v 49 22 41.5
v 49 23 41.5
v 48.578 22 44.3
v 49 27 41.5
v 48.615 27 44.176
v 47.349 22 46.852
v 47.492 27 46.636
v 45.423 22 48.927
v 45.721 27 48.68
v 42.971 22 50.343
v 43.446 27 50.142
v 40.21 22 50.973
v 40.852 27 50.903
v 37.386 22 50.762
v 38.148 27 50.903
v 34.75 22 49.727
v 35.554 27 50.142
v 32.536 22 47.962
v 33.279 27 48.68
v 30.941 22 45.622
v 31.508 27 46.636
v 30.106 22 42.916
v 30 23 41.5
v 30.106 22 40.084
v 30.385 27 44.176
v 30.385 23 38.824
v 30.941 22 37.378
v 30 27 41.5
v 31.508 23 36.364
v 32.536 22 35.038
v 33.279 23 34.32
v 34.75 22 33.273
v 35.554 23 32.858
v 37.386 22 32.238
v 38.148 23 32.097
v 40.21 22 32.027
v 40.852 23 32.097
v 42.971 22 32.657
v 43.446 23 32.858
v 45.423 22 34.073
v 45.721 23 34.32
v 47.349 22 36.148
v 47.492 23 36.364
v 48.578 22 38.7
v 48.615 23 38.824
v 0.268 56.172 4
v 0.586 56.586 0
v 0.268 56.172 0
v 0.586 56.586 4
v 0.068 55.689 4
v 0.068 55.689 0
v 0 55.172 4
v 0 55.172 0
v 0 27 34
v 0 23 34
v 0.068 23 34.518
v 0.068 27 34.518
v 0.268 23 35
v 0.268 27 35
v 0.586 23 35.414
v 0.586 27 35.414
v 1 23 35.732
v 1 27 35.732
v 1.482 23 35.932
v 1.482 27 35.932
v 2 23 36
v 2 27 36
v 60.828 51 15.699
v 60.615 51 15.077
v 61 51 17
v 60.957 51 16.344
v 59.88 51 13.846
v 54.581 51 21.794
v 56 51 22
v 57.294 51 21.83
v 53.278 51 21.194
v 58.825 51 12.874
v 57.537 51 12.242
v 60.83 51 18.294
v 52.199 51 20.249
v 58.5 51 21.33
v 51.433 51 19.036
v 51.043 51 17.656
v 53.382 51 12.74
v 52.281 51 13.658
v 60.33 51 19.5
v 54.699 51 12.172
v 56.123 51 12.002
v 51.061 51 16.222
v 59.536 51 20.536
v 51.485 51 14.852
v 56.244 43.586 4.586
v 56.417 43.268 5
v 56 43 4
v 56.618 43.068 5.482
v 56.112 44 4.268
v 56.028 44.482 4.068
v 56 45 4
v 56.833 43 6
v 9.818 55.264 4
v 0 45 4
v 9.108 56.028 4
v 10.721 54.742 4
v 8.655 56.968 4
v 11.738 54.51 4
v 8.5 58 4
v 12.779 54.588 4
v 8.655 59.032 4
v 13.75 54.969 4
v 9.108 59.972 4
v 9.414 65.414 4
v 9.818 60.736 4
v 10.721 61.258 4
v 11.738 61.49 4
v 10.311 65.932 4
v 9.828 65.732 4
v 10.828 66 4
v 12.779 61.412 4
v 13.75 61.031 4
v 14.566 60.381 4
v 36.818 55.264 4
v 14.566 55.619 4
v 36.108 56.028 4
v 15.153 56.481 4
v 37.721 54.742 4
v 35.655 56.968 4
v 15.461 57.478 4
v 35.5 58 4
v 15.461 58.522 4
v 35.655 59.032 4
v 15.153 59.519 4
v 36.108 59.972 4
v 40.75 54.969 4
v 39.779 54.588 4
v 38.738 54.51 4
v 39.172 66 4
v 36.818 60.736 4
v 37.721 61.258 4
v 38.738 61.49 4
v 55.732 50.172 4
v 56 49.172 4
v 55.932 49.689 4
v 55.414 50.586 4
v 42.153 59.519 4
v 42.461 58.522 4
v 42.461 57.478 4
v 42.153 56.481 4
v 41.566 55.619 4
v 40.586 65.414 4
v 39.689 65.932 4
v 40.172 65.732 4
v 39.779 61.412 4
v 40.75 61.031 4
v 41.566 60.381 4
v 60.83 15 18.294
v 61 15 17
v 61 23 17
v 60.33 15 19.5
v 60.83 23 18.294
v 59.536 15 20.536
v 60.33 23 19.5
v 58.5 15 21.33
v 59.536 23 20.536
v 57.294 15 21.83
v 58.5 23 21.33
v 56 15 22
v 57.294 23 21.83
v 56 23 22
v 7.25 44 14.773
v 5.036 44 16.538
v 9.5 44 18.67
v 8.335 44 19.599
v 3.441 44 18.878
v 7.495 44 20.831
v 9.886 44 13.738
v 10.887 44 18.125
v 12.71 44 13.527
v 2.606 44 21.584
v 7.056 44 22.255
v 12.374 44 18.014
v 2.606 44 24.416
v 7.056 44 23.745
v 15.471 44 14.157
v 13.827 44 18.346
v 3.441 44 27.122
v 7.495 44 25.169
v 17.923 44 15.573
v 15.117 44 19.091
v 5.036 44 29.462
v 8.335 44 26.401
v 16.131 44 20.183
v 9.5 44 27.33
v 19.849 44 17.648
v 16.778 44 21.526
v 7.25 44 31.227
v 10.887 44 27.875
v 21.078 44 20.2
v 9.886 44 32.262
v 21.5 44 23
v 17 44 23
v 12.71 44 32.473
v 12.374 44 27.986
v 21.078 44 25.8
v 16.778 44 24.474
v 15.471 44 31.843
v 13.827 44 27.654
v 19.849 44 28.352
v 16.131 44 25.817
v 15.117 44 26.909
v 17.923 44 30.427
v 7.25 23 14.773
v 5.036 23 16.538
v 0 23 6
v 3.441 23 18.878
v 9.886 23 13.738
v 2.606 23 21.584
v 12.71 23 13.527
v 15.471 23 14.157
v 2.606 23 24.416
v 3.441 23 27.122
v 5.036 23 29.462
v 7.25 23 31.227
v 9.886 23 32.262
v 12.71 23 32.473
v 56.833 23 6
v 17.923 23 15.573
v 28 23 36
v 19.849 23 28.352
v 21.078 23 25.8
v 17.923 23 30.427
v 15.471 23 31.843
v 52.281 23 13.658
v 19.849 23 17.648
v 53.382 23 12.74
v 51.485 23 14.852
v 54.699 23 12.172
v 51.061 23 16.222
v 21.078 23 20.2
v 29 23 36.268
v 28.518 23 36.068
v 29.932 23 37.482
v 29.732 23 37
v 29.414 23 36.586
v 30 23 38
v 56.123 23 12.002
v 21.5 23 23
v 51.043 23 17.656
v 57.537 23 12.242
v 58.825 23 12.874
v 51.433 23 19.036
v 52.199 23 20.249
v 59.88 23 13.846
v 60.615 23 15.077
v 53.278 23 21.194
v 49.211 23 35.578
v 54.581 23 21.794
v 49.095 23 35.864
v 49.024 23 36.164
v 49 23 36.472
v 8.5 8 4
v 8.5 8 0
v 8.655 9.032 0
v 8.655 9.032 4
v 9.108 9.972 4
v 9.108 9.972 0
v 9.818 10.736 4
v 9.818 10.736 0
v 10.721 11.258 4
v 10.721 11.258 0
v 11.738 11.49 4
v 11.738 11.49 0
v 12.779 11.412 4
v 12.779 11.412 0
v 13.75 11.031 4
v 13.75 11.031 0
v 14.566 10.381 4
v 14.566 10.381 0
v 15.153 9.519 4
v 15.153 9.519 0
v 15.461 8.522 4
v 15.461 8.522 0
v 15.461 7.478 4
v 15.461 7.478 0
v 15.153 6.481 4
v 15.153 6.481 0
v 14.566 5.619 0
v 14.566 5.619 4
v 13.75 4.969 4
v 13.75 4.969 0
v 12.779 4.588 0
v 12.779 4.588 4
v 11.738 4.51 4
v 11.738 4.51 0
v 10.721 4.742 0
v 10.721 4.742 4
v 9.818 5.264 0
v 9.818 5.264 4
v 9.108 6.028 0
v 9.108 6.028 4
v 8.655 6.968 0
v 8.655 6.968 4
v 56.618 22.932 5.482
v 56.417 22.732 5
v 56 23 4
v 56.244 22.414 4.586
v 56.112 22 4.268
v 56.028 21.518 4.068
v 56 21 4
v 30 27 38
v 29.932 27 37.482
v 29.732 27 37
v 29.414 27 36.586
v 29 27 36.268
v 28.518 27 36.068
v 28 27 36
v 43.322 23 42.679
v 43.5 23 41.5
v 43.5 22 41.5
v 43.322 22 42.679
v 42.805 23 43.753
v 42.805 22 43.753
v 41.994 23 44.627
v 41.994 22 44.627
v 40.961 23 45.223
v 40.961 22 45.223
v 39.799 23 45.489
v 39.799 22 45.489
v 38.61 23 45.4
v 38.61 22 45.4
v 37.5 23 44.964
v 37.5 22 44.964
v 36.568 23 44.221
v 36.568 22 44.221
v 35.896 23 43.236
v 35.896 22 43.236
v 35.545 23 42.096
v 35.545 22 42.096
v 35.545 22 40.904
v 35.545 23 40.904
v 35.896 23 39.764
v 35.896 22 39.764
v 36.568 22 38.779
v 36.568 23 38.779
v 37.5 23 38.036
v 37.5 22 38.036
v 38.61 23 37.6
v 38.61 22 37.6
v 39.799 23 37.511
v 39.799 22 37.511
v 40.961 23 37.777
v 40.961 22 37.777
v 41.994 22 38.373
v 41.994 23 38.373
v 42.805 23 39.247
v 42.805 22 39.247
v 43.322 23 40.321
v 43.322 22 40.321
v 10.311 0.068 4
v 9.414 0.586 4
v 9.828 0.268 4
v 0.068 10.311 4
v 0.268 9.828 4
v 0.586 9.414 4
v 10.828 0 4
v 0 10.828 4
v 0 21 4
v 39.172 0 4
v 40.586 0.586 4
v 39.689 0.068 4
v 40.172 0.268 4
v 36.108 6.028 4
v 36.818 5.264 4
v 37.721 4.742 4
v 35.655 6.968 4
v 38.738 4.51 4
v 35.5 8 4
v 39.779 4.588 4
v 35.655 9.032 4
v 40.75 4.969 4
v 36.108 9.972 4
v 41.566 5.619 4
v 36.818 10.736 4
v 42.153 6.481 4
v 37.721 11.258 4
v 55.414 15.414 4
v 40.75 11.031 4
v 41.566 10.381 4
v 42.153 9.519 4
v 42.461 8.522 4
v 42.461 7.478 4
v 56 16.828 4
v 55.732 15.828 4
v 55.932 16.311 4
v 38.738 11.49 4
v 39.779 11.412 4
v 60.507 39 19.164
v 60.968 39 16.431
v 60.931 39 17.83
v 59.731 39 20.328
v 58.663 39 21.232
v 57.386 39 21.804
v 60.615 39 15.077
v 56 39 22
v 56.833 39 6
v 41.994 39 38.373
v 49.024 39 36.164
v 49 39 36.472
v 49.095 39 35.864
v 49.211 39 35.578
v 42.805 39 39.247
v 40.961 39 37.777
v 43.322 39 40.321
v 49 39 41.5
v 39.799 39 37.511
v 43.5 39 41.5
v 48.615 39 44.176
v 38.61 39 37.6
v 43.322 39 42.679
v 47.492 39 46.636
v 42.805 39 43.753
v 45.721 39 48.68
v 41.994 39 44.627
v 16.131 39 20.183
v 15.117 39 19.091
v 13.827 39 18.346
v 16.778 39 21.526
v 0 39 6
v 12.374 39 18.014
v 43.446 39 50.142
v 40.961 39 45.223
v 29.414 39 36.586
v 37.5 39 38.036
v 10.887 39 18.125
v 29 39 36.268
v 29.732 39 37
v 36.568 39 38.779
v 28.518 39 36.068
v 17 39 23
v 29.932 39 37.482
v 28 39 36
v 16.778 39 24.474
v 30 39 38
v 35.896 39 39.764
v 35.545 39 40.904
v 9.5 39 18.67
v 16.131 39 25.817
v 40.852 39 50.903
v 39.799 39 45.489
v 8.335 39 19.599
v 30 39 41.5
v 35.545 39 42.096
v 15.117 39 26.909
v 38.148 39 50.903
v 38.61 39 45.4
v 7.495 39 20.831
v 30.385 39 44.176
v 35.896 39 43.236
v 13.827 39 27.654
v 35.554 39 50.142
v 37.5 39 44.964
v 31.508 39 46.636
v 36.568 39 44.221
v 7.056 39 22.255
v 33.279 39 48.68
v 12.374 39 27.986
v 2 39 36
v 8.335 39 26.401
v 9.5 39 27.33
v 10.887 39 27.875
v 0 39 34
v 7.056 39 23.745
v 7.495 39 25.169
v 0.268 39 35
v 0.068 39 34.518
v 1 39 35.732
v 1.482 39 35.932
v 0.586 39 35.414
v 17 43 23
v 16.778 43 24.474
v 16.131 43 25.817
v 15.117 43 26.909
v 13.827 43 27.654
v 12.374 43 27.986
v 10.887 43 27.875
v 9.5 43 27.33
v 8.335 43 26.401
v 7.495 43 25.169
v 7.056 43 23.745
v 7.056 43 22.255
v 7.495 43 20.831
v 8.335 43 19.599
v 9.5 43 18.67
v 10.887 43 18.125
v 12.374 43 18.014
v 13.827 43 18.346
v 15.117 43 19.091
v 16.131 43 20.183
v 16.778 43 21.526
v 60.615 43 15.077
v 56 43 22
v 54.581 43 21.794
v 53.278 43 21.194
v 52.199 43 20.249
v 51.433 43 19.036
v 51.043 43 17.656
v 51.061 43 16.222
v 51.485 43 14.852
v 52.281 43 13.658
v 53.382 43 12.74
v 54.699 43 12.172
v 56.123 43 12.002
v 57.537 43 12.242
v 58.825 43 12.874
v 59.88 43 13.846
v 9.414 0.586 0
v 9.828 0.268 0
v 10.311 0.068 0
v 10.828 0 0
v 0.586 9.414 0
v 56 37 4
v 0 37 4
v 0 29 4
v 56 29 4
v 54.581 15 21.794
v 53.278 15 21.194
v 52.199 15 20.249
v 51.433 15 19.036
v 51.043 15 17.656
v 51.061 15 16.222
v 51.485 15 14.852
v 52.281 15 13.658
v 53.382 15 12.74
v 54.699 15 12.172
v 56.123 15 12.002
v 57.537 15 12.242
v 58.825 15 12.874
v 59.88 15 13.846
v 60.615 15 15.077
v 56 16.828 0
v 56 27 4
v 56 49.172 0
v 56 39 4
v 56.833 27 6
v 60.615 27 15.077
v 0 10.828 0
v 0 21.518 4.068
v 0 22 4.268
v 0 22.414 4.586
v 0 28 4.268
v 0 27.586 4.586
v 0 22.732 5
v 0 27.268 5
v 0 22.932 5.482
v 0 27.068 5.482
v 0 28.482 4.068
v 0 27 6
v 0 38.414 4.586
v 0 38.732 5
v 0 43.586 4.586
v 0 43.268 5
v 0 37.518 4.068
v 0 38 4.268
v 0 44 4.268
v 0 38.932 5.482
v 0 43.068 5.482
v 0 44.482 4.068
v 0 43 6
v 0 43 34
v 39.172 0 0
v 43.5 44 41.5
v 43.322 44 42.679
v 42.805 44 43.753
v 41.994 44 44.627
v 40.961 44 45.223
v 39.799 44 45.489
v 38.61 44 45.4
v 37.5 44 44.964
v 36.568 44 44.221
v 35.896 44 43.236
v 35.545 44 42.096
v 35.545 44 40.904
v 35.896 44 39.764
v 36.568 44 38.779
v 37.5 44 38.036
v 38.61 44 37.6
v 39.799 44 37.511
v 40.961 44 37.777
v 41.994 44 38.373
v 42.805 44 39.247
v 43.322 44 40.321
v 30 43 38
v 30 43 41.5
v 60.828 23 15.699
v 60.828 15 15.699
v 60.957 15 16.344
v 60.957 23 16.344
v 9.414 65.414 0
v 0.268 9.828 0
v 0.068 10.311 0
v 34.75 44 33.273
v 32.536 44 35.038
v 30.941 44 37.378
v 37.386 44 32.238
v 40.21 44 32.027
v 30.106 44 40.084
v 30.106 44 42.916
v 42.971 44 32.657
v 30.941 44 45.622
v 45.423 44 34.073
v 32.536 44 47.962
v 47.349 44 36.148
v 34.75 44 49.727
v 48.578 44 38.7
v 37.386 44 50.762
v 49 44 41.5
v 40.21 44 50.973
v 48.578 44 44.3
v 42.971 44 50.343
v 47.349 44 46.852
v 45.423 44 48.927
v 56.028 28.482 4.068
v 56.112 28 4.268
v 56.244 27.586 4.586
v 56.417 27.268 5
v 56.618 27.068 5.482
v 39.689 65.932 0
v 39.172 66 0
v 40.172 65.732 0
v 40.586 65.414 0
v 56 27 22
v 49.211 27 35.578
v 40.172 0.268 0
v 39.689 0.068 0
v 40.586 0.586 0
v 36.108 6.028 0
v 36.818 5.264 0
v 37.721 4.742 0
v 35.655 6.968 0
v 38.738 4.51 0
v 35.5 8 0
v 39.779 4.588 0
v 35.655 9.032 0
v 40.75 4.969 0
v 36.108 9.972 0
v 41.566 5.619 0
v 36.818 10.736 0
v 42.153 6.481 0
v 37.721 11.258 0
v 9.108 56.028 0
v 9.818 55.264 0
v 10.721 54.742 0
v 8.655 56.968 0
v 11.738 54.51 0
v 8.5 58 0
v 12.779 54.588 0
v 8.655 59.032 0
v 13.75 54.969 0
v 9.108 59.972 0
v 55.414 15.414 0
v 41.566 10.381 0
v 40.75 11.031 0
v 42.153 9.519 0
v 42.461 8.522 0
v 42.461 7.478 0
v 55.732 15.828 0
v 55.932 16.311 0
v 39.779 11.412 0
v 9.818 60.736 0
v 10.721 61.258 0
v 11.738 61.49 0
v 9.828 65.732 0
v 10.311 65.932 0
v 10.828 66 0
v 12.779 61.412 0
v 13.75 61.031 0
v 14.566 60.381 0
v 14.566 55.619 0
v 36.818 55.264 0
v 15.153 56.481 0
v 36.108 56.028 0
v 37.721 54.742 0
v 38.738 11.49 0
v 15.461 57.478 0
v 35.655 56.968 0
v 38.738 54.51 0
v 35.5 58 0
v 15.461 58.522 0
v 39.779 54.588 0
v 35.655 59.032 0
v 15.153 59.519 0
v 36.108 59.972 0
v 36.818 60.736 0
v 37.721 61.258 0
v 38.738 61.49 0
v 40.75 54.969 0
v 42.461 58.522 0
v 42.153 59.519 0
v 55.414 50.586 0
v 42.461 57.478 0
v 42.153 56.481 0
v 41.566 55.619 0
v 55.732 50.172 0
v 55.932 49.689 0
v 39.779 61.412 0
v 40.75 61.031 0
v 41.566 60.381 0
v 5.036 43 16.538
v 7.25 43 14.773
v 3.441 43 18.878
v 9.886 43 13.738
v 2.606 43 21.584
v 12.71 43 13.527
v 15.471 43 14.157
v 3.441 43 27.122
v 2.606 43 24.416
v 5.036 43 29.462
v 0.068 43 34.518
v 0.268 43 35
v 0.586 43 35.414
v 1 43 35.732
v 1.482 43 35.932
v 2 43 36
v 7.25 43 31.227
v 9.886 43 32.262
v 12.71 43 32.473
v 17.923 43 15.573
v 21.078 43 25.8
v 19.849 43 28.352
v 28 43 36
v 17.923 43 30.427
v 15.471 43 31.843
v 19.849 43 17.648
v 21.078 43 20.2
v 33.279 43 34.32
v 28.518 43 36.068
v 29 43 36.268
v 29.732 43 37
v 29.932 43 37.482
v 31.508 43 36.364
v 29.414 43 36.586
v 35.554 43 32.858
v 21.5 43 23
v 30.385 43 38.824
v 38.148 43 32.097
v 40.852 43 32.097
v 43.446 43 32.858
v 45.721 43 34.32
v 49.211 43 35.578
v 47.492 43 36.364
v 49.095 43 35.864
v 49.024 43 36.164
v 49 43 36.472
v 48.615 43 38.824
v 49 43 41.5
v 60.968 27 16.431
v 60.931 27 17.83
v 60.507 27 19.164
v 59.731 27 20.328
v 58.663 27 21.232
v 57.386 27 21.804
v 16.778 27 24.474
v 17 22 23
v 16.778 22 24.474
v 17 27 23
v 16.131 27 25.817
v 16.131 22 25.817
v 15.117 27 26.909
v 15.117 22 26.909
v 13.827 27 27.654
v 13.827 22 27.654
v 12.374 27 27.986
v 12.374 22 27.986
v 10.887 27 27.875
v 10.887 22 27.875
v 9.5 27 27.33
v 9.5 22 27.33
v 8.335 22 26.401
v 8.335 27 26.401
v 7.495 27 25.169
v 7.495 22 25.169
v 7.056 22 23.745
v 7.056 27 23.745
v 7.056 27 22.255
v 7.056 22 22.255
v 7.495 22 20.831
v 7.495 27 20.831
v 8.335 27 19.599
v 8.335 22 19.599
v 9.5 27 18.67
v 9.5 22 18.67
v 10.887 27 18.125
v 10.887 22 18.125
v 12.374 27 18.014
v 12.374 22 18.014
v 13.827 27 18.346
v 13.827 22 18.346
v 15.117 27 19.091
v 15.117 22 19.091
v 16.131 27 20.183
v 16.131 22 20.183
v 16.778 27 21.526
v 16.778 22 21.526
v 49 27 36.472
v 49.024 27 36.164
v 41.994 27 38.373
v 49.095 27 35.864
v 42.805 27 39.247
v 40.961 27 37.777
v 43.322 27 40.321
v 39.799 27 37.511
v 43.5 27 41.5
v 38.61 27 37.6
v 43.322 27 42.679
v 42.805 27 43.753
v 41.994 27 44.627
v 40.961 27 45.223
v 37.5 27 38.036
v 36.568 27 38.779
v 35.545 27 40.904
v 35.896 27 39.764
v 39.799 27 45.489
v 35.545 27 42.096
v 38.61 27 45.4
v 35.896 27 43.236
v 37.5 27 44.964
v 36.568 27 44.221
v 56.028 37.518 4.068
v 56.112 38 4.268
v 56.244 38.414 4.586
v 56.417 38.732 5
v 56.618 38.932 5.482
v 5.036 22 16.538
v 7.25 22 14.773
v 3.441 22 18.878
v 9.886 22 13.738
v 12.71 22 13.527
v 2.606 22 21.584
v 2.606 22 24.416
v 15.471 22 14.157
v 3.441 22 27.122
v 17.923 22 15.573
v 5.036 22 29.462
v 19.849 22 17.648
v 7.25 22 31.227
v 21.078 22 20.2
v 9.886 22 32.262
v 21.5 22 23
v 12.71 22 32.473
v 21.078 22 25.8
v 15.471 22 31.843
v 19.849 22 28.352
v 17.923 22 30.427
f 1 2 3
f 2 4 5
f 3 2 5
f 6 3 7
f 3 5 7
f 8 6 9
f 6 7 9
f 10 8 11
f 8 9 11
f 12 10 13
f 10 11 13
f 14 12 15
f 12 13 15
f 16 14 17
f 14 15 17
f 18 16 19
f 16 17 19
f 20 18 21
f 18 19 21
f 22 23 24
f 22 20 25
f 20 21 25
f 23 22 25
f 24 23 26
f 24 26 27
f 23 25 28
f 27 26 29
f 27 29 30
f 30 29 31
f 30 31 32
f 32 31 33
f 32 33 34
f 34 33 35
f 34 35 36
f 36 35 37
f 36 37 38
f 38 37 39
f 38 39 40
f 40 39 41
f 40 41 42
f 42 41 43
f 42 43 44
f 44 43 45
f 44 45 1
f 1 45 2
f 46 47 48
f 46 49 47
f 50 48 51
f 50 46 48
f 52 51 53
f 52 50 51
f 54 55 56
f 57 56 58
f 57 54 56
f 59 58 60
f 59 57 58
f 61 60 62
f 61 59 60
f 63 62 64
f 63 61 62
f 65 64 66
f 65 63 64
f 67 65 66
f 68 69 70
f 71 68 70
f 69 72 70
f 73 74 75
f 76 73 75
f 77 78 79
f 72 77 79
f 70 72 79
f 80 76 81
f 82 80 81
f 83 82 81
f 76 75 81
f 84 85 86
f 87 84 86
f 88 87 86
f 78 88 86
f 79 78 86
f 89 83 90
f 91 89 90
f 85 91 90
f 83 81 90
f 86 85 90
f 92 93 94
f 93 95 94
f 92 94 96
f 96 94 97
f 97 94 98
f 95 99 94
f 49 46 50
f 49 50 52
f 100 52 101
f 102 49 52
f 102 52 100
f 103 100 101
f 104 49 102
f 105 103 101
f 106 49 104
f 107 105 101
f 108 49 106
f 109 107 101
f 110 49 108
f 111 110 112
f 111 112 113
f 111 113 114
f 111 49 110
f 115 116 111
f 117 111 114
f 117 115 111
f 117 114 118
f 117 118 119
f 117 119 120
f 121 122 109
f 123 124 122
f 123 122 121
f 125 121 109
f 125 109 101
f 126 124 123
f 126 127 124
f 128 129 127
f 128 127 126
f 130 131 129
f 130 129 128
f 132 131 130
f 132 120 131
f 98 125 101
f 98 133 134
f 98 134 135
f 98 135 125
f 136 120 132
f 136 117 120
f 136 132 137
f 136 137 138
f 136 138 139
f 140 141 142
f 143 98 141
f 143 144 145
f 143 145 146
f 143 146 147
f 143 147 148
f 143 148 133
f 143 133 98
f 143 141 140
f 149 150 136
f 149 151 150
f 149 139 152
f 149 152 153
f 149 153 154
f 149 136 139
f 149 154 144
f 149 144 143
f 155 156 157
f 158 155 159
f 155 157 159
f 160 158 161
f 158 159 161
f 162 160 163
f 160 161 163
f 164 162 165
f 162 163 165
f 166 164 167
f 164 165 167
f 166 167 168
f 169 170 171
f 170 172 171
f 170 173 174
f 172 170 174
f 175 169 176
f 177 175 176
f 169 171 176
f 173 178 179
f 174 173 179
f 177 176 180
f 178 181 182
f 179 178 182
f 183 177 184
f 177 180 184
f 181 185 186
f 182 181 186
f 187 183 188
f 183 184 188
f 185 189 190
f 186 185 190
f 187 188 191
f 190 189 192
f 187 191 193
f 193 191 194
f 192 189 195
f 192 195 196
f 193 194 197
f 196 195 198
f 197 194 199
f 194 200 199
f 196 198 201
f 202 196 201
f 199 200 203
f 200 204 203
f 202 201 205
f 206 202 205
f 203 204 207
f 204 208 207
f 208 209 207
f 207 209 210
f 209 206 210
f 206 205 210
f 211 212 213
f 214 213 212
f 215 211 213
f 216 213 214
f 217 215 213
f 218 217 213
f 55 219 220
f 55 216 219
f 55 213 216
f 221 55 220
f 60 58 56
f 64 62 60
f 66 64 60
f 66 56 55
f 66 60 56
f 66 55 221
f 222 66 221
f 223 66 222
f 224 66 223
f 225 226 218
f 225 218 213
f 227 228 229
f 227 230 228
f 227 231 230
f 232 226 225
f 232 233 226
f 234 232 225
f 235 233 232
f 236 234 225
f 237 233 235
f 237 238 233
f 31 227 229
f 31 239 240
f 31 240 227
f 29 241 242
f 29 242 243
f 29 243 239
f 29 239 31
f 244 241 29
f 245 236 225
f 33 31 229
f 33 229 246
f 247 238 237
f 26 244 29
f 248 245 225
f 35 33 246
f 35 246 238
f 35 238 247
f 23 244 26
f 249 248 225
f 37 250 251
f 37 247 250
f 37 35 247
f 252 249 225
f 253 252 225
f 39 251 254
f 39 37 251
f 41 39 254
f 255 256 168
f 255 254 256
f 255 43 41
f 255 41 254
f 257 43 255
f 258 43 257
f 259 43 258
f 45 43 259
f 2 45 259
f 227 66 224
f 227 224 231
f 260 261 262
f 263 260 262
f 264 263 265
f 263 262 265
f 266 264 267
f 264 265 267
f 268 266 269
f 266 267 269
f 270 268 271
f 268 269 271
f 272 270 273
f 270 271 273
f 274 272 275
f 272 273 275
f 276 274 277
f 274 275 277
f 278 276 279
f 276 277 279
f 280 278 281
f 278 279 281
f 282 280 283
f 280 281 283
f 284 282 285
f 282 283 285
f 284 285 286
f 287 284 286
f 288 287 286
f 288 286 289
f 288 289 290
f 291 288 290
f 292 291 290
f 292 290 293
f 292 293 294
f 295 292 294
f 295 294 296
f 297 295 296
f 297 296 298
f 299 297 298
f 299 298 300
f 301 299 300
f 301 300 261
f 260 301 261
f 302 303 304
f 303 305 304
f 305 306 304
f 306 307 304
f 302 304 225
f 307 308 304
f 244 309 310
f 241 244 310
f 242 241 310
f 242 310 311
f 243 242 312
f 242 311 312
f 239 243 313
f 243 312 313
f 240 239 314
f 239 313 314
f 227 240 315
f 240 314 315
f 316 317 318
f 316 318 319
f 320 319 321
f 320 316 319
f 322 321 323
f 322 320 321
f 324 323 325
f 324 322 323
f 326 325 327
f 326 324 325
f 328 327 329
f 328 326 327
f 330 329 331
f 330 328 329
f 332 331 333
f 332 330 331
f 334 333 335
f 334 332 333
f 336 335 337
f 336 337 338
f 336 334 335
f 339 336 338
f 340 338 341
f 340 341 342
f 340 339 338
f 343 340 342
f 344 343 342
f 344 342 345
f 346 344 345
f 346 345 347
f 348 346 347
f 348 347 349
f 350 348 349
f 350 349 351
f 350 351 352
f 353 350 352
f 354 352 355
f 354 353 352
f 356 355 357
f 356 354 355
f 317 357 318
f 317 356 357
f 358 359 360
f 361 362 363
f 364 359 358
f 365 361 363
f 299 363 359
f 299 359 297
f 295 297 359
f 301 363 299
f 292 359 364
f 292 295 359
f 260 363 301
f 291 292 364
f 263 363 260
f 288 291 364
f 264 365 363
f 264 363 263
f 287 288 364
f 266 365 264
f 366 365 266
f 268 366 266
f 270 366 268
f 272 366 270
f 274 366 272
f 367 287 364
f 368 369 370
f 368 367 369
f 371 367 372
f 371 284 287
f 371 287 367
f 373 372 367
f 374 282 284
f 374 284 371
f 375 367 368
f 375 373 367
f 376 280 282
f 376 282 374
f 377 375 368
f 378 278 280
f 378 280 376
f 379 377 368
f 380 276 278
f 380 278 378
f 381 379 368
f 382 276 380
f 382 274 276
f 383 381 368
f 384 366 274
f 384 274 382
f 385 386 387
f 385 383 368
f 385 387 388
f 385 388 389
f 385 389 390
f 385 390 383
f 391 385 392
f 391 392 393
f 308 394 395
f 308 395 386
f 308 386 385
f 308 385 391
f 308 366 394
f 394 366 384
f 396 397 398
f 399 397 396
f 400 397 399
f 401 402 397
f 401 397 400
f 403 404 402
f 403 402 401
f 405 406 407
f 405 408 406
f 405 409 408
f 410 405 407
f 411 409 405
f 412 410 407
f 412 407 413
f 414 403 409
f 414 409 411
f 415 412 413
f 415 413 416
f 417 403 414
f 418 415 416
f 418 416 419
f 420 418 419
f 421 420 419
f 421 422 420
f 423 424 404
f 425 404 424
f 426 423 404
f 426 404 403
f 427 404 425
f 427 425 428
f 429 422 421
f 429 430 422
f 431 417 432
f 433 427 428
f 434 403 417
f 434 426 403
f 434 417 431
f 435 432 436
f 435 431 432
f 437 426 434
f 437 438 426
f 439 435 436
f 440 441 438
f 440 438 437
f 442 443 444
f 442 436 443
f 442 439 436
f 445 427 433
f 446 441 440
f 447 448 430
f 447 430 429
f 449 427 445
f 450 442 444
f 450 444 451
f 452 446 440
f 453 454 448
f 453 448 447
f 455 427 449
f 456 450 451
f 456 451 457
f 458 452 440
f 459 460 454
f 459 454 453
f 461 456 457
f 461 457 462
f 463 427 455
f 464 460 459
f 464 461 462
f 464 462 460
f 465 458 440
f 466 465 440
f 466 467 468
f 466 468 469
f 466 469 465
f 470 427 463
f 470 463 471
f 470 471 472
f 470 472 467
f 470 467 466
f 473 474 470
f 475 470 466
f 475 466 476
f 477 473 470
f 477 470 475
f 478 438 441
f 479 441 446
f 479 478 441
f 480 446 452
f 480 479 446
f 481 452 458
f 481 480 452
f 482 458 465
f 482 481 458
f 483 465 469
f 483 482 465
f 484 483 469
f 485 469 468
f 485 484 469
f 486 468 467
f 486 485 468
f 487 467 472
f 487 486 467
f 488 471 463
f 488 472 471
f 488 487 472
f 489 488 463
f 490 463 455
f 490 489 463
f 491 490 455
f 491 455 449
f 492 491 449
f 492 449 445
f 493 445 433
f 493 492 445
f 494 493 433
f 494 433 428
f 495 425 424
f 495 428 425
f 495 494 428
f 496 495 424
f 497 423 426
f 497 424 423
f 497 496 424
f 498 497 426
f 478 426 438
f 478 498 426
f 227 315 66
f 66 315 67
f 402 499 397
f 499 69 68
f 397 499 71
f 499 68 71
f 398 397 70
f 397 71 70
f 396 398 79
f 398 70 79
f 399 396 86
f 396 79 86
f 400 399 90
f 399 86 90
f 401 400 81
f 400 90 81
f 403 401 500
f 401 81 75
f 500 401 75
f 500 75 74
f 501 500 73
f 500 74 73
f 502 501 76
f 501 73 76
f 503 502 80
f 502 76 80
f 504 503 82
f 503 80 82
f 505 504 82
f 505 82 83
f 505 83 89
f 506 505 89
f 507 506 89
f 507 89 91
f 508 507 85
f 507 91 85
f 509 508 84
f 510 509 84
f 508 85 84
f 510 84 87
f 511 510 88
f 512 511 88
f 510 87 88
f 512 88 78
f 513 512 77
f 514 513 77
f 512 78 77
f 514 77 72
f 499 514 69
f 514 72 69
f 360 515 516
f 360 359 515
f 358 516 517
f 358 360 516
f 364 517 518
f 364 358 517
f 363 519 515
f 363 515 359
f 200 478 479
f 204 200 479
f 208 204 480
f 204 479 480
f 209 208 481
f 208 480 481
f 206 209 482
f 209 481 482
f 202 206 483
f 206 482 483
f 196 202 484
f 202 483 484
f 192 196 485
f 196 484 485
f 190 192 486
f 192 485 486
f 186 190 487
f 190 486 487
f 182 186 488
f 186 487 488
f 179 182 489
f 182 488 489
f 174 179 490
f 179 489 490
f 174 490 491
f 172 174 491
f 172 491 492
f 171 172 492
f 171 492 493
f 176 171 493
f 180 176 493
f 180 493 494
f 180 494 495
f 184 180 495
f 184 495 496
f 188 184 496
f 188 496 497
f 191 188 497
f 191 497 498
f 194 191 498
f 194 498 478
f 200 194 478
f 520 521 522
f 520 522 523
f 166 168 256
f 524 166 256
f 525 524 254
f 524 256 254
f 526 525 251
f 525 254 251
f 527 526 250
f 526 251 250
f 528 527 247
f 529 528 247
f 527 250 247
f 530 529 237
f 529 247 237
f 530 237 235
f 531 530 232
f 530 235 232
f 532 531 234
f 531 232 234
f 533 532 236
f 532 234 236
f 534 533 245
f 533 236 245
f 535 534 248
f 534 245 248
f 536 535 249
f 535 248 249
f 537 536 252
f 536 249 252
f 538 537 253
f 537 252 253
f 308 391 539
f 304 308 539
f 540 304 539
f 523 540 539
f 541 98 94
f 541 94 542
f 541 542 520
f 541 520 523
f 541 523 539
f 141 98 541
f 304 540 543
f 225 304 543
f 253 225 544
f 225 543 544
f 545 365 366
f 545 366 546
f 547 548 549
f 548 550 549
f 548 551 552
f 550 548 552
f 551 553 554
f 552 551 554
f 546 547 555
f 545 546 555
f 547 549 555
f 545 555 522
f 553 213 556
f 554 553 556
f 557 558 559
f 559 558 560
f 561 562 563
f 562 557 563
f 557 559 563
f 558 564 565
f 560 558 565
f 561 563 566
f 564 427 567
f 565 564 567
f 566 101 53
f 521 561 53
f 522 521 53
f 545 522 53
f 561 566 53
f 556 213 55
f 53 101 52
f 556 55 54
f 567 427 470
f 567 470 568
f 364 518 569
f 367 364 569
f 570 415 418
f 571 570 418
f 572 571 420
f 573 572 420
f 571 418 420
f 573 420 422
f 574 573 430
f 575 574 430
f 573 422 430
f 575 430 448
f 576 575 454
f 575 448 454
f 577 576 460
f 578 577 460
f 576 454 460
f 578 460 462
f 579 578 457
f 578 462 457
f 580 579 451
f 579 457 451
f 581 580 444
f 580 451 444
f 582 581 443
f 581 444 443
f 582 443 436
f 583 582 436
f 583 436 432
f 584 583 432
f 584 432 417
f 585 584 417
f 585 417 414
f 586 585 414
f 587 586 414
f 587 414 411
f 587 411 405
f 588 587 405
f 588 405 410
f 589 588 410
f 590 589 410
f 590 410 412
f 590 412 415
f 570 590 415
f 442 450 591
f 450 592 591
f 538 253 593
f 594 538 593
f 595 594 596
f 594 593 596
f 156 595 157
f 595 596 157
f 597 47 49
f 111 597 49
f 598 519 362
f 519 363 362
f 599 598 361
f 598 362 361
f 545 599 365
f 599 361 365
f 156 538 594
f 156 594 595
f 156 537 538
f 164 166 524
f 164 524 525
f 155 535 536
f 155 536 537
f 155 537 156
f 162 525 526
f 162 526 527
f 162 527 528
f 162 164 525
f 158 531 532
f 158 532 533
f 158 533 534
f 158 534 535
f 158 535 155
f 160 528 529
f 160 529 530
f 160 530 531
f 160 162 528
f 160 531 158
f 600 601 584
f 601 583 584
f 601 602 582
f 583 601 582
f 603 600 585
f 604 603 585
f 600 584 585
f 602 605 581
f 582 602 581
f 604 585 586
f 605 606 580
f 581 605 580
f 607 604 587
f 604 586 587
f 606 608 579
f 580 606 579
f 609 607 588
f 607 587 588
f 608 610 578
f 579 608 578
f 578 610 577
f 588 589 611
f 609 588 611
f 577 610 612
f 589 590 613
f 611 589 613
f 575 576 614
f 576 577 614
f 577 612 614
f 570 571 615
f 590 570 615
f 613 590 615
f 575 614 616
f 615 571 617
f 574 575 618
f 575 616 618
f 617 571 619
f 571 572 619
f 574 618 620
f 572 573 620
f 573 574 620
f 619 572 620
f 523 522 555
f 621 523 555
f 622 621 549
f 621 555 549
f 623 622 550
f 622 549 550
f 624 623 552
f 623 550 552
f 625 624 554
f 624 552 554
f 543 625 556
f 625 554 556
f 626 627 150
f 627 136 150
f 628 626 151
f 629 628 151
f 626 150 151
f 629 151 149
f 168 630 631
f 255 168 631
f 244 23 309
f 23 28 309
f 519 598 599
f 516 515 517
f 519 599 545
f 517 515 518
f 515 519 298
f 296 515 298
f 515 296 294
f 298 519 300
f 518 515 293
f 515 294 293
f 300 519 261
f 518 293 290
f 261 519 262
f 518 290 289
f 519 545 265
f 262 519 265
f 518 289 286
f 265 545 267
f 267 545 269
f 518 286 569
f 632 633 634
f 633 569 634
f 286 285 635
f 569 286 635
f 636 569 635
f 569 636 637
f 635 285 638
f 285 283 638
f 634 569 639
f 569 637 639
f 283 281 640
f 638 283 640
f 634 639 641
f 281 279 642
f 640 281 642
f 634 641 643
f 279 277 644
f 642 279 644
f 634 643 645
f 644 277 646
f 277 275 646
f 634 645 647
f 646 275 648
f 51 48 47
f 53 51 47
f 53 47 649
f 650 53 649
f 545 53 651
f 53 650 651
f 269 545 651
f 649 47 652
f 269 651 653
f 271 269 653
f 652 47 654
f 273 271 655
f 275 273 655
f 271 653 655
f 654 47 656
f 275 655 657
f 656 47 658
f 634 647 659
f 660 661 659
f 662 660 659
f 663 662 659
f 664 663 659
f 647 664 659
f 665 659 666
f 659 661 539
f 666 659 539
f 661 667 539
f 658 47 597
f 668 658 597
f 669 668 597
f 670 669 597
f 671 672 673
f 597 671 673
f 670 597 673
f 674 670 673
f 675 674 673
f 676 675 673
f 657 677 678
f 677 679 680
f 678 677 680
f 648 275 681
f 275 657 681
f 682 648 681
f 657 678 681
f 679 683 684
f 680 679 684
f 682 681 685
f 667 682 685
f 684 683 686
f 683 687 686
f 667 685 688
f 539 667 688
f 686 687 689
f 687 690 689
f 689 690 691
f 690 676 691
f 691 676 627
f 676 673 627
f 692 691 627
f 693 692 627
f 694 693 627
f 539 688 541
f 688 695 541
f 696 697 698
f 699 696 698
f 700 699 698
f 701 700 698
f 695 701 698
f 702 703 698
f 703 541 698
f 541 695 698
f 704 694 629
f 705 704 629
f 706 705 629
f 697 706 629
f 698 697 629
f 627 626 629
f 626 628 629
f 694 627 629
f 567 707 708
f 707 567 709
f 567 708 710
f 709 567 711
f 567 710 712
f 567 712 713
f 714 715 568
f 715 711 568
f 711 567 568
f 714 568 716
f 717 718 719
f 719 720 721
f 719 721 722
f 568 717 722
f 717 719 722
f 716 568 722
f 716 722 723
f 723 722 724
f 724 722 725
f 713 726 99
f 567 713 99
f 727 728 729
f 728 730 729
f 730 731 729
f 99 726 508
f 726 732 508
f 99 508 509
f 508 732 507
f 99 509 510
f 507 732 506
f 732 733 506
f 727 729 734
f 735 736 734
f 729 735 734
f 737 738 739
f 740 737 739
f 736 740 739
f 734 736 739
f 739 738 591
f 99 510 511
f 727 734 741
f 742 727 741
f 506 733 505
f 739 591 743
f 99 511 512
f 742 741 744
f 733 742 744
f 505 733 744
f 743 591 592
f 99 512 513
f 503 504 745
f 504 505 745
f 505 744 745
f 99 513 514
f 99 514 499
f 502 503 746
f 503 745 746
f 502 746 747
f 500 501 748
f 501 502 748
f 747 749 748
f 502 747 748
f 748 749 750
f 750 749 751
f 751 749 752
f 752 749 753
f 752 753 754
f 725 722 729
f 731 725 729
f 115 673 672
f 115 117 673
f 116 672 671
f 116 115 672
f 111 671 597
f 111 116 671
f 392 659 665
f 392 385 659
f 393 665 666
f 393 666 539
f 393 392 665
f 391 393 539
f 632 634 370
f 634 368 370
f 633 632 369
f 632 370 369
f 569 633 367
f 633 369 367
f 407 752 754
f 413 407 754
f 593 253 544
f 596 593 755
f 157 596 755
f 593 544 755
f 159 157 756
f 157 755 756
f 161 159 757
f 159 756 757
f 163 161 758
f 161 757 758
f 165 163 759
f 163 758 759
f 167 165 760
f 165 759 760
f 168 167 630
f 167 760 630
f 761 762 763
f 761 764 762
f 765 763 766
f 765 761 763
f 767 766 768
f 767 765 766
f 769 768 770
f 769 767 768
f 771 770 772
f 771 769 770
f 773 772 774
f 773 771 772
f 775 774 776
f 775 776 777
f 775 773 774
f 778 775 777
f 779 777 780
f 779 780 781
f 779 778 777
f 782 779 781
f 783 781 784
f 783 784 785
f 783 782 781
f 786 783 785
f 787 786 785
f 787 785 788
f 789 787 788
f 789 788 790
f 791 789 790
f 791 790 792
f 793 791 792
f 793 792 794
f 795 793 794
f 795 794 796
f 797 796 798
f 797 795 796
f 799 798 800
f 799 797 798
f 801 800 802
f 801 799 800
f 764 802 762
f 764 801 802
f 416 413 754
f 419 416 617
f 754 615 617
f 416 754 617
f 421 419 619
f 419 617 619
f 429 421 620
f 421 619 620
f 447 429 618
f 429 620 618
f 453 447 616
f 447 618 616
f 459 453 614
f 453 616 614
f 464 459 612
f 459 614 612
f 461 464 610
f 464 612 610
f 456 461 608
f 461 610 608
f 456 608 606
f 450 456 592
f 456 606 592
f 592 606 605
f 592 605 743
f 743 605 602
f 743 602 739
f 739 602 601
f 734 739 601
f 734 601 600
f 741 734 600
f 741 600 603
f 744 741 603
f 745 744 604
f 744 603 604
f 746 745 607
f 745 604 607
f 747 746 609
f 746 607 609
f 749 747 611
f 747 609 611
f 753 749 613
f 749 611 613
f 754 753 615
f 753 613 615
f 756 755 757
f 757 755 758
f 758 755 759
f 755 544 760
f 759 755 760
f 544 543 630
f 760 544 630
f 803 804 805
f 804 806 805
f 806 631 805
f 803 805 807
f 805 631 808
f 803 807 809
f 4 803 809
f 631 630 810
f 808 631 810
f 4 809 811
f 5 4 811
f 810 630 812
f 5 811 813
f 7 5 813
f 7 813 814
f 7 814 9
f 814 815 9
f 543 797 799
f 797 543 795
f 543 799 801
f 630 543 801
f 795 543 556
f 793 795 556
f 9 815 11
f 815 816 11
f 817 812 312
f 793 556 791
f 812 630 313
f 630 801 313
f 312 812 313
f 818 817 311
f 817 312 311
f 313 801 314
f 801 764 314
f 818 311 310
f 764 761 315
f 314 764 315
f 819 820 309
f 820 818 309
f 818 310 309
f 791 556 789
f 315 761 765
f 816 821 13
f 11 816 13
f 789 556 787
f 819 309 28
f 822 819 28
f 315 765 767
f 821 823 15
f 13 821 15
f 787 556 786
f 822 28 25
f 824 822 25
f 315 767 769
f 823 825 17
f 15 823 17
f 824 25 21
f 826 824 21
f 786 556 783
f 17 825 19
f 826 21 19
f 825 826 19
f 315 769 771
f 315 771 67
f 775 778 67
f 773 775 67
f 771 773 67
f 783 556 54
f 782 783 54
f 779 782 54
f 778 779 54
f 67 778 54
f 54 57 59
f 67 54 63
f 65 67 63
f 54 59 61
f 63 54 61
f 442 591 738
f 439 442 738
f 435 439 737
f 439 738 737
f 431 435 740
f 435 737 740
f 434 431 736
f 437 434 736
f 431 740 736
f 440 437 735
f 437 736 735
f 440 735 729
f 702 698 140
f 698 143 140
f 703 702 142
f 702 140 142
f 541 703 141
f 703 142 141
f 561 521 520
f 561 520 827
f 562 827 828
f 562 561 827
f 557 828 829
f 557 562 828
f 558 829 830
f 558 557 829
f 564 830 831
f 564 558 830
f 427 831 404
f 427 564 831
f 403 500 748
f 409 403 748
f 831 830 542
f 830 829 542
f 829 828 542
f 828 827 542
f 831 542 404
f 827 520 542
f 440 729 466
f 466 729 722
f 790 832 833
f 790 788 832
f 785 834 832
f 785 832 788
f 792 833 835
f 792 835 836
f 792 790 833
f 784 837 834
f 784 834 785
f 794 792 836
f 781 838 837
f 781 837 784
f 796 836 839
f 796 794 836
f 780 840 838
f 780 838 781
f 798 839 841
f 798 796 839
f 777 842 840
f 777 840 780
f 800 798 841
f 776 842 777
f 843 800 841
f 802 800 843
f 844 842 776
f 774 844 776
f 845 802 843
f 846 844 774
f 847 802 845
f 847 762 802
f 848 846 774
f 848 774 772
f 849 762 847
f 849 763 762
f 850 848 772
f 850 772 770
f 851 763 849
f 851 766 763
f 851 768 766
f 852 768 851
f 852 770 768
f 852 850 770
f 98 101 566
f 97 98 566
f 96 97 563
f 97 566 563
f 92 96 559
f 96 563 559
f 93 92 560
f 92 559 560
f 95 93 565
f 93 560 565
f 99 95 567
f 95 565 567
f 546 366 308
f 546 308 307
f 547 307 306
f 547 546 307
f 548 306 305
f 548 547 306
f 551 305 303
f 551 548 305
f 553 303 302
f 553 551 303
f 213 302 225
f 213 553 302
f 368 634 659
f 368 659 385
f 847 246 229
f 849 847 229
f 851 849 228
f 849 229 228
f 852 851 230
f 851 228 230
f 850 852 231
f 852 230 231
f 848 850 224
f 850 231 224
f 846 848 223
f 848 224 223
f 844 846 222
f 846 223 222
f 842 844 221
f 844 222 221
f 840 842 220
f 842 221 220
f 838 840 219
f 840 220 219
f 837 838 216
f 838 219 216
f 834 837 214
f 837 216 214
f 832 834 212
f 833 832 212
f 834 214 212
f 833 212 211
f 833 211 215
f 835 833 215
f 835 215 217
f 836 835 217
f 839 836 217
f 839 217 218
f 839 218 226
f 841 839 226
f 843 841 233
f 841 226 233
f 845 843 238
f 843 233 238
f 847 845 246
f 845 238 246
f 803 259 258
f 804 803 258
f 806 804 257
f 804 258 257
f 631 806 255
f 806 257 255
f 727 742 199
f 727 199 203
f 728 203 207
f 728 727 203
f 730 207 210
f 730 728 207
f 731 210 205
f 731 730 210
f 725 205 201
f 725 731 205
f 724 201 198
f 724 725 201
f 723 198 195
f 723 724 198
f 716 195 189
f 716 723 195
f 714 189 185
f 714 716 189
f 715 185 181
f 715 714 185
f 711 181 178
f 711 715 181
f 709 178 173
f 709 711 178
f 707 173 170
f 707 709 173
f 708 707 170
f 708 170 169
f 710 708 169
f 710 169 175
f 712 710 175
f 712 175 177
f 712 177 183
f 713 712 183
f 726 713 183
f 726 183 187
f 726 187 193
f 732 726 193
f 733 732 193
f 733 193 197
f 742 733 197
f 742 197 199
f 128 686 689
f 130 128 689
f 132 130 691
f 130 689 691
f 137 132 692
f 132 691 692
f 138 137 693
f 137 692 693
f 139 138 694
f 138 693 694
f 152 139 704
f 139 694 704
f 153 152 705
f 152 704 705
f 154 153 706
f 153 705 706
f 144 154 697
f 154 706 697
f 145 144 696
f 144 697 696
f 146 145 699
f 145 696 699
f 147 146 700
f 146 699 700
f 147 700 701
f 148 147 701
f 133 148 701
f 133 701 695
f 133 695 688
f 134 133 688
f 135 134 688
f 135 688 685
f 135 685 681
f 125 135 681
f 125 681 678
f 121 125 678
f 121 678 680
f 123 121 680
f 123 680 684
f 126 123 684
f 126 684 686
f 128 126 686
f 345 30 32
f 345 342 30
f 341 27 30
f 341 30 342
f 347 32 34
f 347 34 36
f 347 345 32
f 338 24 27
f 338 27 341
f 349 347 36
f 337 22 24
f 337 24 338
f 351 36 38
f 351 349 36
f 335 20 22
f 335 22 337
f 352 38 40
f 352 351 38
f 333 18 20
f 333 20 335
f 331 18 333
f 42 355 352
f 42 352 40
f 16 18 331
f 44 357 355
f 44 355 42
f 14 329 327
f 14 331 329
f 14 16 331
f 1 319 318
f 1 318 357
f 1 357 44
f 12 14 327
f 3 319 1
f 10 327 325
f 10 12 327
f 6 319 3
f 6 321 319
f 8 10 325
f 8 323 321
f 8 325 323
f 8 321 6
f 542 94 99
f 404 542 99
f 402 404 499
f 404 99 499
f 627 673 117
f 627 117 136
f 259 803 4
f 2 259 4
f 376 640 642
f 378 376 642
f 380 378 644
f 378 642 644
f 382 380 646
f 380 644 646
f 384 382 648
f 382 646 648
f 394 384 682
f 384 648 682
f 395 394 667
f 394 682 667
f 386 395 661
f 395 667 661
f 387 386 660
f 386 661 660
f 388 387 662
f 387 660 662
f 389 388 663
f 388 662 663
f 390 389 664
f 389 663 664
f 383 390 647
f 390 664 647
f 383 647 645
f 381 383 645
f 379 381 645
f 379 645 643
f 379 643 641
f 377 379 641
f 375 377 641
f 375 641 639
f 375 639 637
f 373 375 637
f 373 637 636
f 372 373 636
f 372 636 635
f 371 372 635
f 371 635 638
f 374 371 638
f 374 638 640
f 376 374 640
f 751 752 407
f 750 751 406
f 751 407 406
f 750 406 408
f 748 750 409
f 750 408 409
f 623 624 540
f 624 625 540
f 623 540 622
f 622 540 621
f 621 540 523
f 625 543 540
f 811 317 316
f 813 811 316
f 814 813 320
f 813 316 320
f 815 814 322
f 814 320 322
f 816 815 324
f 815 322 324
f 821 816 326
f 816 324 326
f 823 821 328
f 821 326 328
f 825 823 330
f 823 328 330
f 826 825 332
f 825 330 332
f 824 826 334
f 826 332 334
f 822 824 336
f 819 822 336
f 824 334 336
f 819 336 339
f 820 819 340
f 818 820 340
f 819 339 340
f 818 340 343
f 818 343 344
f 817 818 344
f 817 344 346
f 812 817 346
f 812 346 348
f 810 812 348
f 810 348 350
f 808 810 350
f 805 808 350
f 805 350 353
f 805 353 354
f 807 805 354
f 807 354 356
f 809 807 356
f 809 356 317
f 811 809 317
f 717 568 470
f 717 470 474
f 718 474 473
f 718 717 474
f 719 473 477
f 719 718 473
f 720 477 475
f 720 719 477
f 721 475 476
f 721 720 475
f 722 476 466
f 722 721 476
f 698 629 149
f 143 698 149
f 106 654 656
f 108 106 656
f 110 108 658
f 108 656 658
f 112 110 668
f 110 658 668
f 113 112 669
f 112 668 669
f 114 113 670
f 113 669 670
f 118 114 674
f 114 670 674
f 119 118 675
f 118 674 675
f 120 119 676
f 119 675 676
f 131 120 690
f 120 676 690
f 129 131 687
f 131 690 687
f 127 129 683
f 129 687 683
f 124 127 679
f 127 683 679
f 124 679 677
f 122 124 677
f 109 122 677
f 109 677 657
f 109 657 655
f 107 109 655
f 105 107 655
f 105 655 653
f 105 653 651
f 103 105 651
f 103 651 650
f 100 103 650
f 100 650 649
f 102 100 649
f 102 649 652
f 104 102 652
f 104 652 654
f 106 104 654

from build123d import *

# Parameters (mm, degrees)
F0_W           = 56
F0_H           = 66
F1_DEPTH       = 4
F3_D           = 7
F4_SIZE2       = 10
F4_SIZE        = 10
F5_SIZE2       = 16
F5_SIZE        = 16
F8_DEPTH       = 10
F8_DEPTH_BACK  = 10
F9_R           = 2
F11_R          = 5
F11_R_2        = 4
F12_DEPTH      = 20
F11_R_3        = 9.5
F13_DEPTH      = 1
F13_DEPTH_BACK = 21
F15_DEPTH      = 8
F15_DEPTH_BACK = 28
F10_W          = 12
F10_H          = 50
F16_DEPTH      = 61.001
F18_T4_DEPTH   = 56
F18_T9_DEPTH   = 61
F18_T15_DEPTH  = 56
F18_T20_DEPTH  = 61
F18_T26_DEPTH  = 56
F18_T31_DEPTH  = 61
F18_T37_DEPTH  = 56
F18_T42_DEPTH  = 61
F19_R          = 2


# Not quite as in the source:
# - a fillet or chamfer that OpenCascade refuses, or shapes differently, is made with other operations: its cross-section is extruded or revolved along the edge and cut away or added


with BuildPart() as f1:
    # F0 (on Top) → F1 (new body)
    with BuildSketch(Plane.XY):
        with Locations((28, 33)):
            Rectangle(F0_W, F0_H)
    extrude(amount=F1_DEPTH)

    # F3 (through all)
    with Locations(Plane.XY.offset(4)):
        with Locations((12, 58), (39, 58), (39, 8), (12, 8)):
            Hole(F3_D / 2)

    # F4
    f4_edges = [f1.edges().sort_by_distance(p)[0] for p in [
        (0, 66, 2),
        (0, 0, 2),
    ]]
    chamfer(f4_edges, length=F4_SIZE, length2=F4_SIZE2)

    # F5
    f5_edges = [f1.edges().sort_by_distance(p)[0] for p in [
        (56, 66, 2),
        (56, 0, 2),
    ]]
    chamfer(f5_edges, length=F5_SIZE, length2=F5_SIZE2)


with BuildPart() as f8:
    # F7 (on mid) → F8 (new body, two sides)
    with BuildSketch(Plane.XZ.offset(-33)) as f8_sk:
        with BuildLine():
            Line((0, 36), (0, 4))
            Line((0, 4), (56, 4))
            Line((56, 4), (60.6153846154, 15.0769230769))
            ThreePointArc((60.6153846154, 15.0769230769), (60.1602514717, 19.7735009811), (56, 22))
            Line((56, 22), (49, 36))
            Line((49, 36), (49, 41.5))
            ThreePointArc((49, 41.5), (39.5, 51), (30, 41.5))
            Line((30, 41.5), (30, 36))
            Line((30, 36), (0, 36))
        make_face()
    extrude(amount=-F8_DEPTH)
    extrude(f8_sk.sketch, amount=F8_DEPTH_BACK)

    # F9
    f9_edges = [f8.edges().sort_by_distance(p)[0] for p in [
        (30, 33, 36),
        (49, 33, 36),
        (0, 33, 36),
    ]]
    fillet(f9_edges, radius=F9_R)

    # F11 (on face) → F12 (cut, through all)
    with BuildSketch(Plane.XZ.offset(-23)):
        with Locations((12, 23)):
            Circle(F11_R)
        with Locations((39.5, 41.5)):
            Circle(F11_R_2)
    extrude(amount=-F12_DEPTH, mode=Mode.SUBTRACT)

    # F11 (on face) → F13 (join, two sides)
    with BuildSketch(Plane.XZ.offset(-23)) as f13_sk:
        with Locations((12, 23)):
            Circle(F11_R_3)
        with Locations((12, 23)):
            Circle(F11_R, mode=Mode.SUBTRACT)
        with BuildLine():
            ThreePointArc((30, 41.5), (39.5, 32), (49, 41.5))
            ThreePointArc((49, 41.5), (39.5, 51), (30, 41.5))
        make_face()
        with Locations((39.5, 41.5)):
            Circle(F11_R_2, mode=Mode.SUBTRACT)
    extrude(amount=F13_DEPTH)
    extrude(f13_sk.sketch, amount=-F13_DEPTH_BACK)

    # F14 (on face) → F15 (join, two sides)
    with BuildSketch(Plane.XZ.offset(-23)) as f15_sk:
        with BuildLine():
            ThreePointArc((60.6153846154, 15.0769230769), (60.9029033785, 16.0194193243), (61, 17))
            ThreePointArc((61, 17), (59.5355339059, 20.5355339059), (56, 22))
            ThreePointArc((56, 22), (51.8397485283, 14.2264990189), (60.6153846154, 15.0769230769))
        make_face()
    extrude(amount=F15_DEPTH)
    extrude(f15_sk.sketch, amount=-F15_DEPTH_BACK)

    # F10 (on face) → F16 (cut, through all)
    with BuildSketch(Plane(origin=(0, 0, 0), x_dir=(0, -1, 0), z_dir=(-1, 0, 0))):
        with Locations((-33, 29)):
            Rectangle(F10_W, F10_H)
    extrude(amount=-F16_DEPTH, mode=Mode.SUBTRACT)


with BuildPart() as f1_1:
    add(f1.part)

    # F17: union F8
    add(f8.part)

    # F18: fillet of radius 2 on 4 edges, made by hand


with BuildPart() as f18_tool2:
    # F18_s3 → F18_t4 (new body)
    with BuildSketch(Plane.YZ):
        with BuildLine():
            ThreePointArc((21, 4), (22.4142135624, 4.5857864376), (23, 6))
            Line((23, 6), (23, 4))
            Line((23, 4), (21, 4))
        make_face()
    extrude(amount=F18_T4_DEPTH)

    split(bisect_by=Plane(origin=(46.2958579882, 0, -19.2899408284), x_dir=(0, 1, 0), z_dir=(-0.9230769231, 0, 0.3846153846)), keep=Keep.TOP)


with BuildPart() as f1_2:
    add(f1_1.part)

    # F18_t1: union F18_tool2
    add(f18_tool2.part)


with BuildPart() as f18_tool7:
    # F18_s8 → F18_t9 (new body)
    with BuildSketch(Plane.YZ):
        with BuildLine():
            ThreePointArc((21, 4), (22.4142135624, 4.5857864376), (23, 6))
            Line((23, 6), (23, 4))
            Line((23, 4), (21, 4))
        make_face()
    extrude(amount=F18_T9_DEPTH)

    split(bisect_by=Plane.YZ.offset(56), keep=Keep.TOP)

    split(bisect_by=Plane(origin=(46.2958579882, 0, -19.2899408284), x_dir=(0, 1, 0), z_dir=(-0.9230769231, 0, 0.3846153846)), keep=Keep.TOP)


with BuildPart() as f1_3:
    add(f1_2.part)

    # F18_t6: union F18_tool7
    add(f18_tool7.part)


with BuildPart() as f18_tool13:
    # F18_s14 → F18_t15 (new body)
    with BuildSketch(Plane.YZ):
        with BuildLine():
            ThreePointArc((37, 4), (38.4142135624, 4.5857864376), (39, 6))
            Line((39, 6), (39, 4))
            Line((39, 4), (37, 4))
        make_face()
    extrude(amount=F18_T15_DEPTH)

    split(bisect_by=Plane(origin=(46.2958579882, 0, -19.2899408284), x_dir=(0, 1, 0), z_dir=(-0.9230769231, 0, 0.3846153846)), keep=Keep.TOP)


with BuildPart() as f1_4:
    add(f1_3.part)

    # F18_t12: union F18_tool13
    add(f18_tool13.part)


with BuildPart() as f18_tool18:
    # F18_s19 → F18_t20 (new body)
    with BuildSketch(Plane.YZ):
        with BuildLine():
            ThreePointArc((37, 4), (38.4142135624, 4.5857864376), (39, 6))
            Line((39, 6), (39, 4))
            Line((39, 4), (37, 4))
        make_face()
    extrude(amount=F18_T20_DEPTH)

    split(bisect_by=Plane.YZ.offset(56), keep=Keep.TOP)

    split(bisect_by=Plane(origin=(46.2958579882, 0, -19.2899408284), x_dir=(0, 1, 0), z_dir=(-0.9230769231, 0, 0.3846153846)), keep=Keep.TOP)


with BuildPart() as f1_5:
    add(f1_4.part)

    # F18_t17: union F18_tool18
    add(f18_tool18.part)


with BuildPart() as f18_tool24:
    # F18_s25 → F18_t26 (new body)
    with BuildSketch(Plane.YZ):
        with BuildLine():
            ThreePointArc((45, 4), (43.5857864376, 4.5857864376), (43, 6))
            Line((43, 6), (43, 4))
            Line((43, 4), (45, 4))
        make_face()
    extrude(amount=F18_T26_DEPTH)

    split(bisect_by=Plane(origin=(46.2958579882, 0, -19.2899408284), x_dir=(0, 1, 0), z_dir=(-0.9230769231, 0, 0.3846153846)), keep=Keep.TOP)


with BuildPart() as f1_6:
    add(f1_5.part)

    # F18_t23: union F18_tool24
    add(f18_tool24.part)


with BuildPart() as f18_tool29:
    # F18_s30 → F18_t31 (new body)
    with BuildSketch(Plane.YZ):
        with BuildLine():
            ThreePointArc((45, 4), (43.5857864376, 4.5857864376), (43, 6))
            Line((43, 6), (43, 4))
            Line((43, 4), (45, 4))
        make_face()
    extrude(amount=F18_T31_DEPTH)

    split(bisect_by=Plane.YZ.offset(56), keep=Keep.TOP)

    split(bisect_by=Plane(origin=(46.2958579882, 0, -19.2899408284), x_dir=(0, 1, 0), z_dir=(-0.9230769231, 0, 0.3846153846)), keep=Keep.TOP)


with BuildPart() as f1_7:
    add(f1_6.part)

    # F18_t28: union F18_tool29
    add(f18_tool29.part)


with BuildPart() as f18_tool35:
    # F18_s36 → F18_t37 (new body)
    with BuildSketch(Plane.YZ):
        with BuildLine():
            ThreePointArc((29, 4), (27.5857864376, 4.5857864376), (27, 6))
            Line((27, 6), (27, 4))
            Line((27, 4), (29, 4))
        make_face()
    extrude(amount=F18_T37_DEPTH)

    split(bisect_by=Plane(origin=(46.2958579882, 0, -19.2899408284), x_dir=(0, 1, 0), z_dir=(-0.9230769231, 0, 0.3846153846)), keep=Keep.TOP)


with BuildPart() as f1_8:
    add(f1_7.part)

    # F18_t34: union F18_tool35
    add(f18_tool35.part)


with BuildPart() as f18_tool40:
    # F18_s41 → F18_t42 (new body)
    with BuildSketch(Plane.YZ):
        with BuildLine():
            ThreePointArc((29, 4), (27.5857864376, 4.5857864376), (27, 6))
            Line((27, 6), (27, 4))
            Line((27, 4), (29, 4))
        make_face()
    extrude(amount=F18_T42_DEPTH)

    split(bisect_by=Plane.YZ.offset(56), keep=Keep.TOP)

    split(bisect_by=Plane(origin=(46.2958579882, 0, -19.2899408284), x_dir=(0, 1, 0), z_dir=(-0.9230769231, 0, 0.3846153846)), keep=Keep.TOP)


with BuildPart() as f1_9:
    add(f1_8.part)

    # F18_t39: union F18_tool40
    add(f18_tool40.part)

    # F19
    f19_edges = [f1_9.edges().sort_by_distance(p)[0] for p in [
        (40, 0, 2),
        (56, 16, 2),
        (10, 0, 2),
        (56, 50, 2),
        (40, 66, 2),
        (10, 66, 2),
        (0, 56, 2),
        (0, 10, 2),
    ]]
    fillet(f19_edges, radius=F19_R)


solid = f1_9.part
